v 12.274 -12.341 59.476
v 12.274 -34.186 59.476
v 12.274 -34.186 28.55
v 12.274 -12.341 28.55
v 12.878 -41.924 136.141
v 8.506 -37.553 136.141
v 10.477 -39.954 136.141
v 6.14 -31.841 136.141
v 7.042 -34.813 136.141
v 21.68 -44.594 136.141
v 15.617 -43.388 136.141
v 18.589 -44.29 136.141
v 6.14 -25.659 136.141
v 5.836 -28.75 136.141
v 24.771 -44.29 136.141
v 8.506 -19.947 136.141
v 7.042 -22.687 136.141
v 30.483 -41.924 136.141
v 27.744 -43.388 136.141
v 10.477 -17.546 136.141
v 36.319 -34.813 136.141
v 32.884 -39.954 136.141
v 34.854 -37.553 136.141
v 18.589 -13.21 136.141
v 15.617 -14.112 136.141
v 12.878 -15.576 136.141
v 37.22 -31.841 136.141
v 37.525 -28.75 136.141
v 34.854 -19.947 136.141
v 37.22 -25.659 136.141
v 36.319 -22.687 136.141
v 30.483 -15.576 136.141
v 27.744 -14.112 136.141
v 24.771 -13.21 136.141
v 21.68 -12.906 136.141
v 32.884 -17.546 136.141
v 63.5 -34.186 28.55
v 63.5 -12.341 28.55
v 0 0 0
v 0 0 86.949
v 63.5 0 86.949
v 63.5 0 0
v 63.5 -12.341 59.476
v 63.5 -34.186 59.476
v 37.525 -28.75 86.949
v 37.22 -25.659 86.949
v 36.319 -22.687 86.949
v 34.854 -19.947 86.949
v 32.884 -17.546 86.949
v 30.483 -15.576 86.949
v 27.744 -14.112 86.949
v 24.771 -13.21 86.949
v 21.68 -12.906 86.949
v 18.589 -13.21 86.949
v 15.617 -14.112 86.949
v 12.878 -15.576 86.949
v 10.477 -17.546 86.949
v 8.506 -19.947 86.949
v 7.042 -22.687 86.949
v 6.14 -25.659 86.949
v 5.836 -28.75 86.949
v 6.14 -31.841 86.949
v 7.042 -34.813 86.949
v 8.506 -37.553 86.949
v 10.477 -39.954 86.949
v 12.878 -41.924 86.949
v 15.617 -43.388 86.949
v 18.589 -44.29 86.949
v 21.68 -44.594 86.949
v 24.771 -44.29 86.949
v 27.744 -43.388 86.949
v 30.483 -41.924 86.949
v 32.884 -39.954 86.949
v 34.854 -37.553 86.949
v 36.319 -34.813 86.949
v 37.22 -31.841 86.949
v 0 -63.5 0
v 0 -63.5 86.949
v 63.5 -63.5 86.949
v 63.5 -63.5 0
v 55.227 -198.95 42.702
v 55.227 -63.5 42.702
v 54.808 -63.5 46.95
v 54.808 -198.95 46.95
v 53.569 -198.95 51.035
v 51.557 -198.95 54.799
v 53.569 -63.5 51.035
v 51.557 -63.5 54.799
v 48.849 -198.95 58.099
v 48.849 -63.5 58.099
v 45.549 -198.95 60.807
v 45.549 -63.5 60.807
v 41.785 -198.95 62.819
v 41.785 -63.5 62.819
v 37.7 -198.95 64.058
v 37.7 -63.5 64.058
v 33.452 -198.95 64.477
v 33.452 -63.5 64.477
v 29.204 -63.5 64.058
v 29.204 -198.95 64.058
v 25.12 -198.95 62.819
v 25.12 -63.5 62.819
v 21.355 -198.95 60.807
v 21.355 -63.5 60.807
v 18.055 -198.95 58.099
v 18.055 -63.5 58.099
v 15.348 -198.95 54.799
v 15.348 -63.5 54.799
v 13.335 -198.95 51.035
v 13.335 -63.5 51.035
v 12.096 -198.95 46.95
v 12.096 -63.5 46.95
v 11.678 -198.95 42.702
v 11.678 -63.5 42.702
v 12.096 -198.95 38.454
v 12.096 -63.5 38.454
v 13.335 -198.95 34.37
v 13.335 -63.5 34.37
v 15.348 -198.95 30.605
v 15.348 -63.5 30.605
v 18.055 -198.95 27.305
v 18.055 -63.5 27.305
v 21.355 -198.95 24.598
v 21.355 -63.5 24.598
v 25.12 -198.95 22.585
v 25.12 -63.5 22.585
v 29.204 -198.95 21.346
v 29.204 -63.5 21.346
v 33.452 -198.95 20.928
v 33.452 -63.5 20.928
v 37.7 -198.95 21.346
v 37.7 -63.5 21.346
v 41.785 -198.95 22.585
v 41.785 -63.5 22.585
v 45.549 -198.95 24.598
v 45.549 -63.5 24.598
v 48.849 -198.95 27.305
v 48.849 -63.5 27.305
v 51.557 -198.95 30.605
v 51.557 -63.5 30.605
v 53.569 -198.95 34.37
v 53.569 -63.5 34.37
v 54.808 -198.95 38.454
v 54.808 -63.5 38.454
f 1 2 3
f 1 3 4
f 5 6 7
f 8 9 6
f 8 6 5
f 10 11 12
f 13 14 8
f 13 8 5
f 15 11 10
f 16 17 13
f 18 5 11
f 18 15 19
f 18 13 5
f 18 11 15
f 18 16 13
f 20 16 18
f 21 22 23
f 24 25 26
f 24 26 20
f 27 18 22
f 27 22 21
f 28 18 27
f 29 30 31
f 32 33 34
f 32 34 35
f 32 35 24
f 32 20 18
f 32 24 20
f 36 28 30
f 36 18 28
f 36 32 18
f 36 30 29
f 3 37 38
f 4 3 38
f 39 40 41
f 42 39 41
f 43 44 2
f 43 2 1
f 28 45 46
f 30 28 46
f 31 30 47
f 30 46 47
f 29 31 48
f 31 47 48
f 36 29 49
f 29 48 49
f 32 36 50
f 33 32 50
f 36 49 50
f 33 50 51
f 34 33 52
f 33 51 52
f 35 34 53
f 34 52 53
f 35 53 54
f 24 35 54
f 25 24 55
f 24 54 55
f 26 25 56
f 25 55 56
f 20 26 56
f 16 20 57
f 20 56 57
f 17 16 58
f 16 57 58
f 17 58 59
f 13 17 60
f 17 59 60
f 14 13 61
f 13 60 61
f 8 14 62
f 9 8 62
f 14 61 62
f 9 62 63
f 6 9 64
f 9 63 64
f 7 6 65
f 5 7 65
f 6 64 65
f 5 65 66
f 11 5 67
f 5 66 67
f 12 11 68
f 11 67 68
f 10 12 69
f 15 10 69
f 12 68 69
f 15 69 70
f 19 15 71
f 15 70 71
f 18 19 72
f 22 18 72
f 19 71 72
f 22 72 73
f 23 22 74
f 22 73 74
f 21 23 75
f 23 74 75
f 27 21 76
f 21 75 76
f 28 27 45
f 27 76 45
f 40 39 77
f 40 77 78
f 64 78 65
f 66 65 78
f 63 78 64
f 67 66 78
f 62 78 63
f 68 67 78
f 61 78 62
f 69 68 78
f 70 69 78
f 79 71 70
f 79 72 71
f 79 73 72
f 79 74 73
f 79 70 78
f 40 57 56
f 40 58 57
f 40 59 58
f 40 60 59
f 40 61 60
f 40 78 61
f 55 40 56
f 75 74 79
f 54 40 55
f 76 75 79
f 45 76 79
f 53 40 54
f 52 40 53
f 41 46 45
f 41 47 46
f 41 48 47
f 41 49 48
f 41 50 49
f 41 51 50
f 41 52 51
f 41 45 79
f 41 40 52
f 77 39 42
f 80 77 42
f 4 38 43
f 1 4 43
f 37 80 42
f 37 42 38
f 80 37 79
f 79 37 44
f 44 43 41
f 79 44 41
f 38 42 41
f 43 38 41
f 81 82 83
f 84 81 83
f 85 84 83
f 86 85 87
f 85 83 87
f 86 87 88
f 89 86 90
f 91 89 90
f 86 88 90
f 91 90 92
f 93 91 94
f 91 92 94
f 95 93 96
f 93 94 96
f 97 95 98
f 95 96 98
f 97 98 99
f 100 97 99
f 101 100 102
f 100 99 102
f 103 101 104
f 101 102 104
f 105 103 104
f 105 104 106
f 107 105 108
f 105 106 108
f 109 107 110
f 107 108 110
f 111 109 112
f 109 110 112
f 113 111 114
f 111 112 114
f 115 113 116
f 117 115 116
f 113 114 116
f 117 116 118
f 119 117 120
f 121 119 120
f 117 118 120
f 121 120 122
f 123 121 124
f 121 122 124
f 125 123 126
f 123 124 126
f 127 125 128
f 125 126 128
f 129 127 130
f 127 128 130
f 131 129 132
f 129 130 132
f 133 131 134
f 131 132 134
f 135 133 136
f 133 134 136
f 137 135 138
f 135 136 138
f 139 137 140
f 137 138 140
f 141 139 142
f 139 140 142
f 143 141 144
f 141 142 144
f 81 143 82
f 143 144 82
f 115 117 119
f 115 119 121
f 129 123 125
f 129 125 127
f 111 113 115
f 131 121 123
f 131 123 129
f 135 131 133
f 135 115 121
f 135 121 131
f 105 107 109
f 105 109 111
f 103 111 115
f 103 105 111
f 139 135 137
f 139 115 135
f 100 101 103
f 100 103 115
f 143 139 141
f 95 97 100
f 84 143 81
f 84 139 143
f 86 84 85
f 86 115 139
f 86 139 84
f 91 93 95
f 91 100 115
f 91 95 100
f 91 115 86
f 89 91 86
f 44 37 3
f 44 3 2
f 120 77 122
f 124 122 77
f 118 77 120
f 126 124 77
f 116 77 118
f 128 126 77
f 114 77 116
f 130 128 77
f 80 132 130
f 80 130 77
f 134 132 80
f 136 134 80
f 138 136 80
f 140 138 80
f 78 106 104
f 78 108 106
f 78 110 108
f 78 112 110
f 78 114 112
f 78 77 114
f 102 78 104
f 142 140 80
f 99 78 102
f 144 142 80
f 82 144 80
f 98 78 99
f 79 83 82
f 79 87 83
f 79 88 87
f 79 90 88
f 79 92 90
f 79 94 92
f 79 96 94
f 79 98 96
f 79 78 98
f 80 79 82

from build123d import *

# Parameters (mm, degrees)
F0_W     = 63.5
F0_H     = 86.9489126992
F1_DEPTH = 63.5
F2_R     = 15.8444471424
F3_DEPTH = 49.1919759661
F4_W     = 21.8449309468
F4_H     = 30.9254080057
F5_DEPTH = 51.2255001813
F6_R     = 21.7743168909
F7_DEPTH = 135.4503948241


with BuildPart() as f1:
    # F0 (on Front) → F1 (new body)
    with BuildSketch(Plane.XZ):
        with Locations((31.75, 43.4744563496)):
            Rectangle(F0_W, F0_H)
    extrude(amount=F1_DEPTH)

    # F2 (on face) → F3 (join)
    with BuildSketch(Plane.XY.offset(86.9489126992)):
        with Locations((21.6802954674, -28.7499539554)):
            Circle(F2_R)
    extrude(amount=F3_DEPTH)

    # F4 (on face) → F5 (cut)
    with BuildSketch(Plane.YZ.offset(63.5)):
        with Locations((-23.2634544373, 44.0129265189)):
            Rectangle(F4_W, F4_H)
    extrude(amount=-F5_DEPTH, mode=Mode.SUBTRACT)

    # F6 (on face) → F7 (join)
    with BuildSketch(Plane.XZ.offset(63.5)):
        with Locations((33.4522090852, 42.7022464573)):
            Circle(F6_R)
    extrude(amount=F7_DEPTH)


solid = f1.part
